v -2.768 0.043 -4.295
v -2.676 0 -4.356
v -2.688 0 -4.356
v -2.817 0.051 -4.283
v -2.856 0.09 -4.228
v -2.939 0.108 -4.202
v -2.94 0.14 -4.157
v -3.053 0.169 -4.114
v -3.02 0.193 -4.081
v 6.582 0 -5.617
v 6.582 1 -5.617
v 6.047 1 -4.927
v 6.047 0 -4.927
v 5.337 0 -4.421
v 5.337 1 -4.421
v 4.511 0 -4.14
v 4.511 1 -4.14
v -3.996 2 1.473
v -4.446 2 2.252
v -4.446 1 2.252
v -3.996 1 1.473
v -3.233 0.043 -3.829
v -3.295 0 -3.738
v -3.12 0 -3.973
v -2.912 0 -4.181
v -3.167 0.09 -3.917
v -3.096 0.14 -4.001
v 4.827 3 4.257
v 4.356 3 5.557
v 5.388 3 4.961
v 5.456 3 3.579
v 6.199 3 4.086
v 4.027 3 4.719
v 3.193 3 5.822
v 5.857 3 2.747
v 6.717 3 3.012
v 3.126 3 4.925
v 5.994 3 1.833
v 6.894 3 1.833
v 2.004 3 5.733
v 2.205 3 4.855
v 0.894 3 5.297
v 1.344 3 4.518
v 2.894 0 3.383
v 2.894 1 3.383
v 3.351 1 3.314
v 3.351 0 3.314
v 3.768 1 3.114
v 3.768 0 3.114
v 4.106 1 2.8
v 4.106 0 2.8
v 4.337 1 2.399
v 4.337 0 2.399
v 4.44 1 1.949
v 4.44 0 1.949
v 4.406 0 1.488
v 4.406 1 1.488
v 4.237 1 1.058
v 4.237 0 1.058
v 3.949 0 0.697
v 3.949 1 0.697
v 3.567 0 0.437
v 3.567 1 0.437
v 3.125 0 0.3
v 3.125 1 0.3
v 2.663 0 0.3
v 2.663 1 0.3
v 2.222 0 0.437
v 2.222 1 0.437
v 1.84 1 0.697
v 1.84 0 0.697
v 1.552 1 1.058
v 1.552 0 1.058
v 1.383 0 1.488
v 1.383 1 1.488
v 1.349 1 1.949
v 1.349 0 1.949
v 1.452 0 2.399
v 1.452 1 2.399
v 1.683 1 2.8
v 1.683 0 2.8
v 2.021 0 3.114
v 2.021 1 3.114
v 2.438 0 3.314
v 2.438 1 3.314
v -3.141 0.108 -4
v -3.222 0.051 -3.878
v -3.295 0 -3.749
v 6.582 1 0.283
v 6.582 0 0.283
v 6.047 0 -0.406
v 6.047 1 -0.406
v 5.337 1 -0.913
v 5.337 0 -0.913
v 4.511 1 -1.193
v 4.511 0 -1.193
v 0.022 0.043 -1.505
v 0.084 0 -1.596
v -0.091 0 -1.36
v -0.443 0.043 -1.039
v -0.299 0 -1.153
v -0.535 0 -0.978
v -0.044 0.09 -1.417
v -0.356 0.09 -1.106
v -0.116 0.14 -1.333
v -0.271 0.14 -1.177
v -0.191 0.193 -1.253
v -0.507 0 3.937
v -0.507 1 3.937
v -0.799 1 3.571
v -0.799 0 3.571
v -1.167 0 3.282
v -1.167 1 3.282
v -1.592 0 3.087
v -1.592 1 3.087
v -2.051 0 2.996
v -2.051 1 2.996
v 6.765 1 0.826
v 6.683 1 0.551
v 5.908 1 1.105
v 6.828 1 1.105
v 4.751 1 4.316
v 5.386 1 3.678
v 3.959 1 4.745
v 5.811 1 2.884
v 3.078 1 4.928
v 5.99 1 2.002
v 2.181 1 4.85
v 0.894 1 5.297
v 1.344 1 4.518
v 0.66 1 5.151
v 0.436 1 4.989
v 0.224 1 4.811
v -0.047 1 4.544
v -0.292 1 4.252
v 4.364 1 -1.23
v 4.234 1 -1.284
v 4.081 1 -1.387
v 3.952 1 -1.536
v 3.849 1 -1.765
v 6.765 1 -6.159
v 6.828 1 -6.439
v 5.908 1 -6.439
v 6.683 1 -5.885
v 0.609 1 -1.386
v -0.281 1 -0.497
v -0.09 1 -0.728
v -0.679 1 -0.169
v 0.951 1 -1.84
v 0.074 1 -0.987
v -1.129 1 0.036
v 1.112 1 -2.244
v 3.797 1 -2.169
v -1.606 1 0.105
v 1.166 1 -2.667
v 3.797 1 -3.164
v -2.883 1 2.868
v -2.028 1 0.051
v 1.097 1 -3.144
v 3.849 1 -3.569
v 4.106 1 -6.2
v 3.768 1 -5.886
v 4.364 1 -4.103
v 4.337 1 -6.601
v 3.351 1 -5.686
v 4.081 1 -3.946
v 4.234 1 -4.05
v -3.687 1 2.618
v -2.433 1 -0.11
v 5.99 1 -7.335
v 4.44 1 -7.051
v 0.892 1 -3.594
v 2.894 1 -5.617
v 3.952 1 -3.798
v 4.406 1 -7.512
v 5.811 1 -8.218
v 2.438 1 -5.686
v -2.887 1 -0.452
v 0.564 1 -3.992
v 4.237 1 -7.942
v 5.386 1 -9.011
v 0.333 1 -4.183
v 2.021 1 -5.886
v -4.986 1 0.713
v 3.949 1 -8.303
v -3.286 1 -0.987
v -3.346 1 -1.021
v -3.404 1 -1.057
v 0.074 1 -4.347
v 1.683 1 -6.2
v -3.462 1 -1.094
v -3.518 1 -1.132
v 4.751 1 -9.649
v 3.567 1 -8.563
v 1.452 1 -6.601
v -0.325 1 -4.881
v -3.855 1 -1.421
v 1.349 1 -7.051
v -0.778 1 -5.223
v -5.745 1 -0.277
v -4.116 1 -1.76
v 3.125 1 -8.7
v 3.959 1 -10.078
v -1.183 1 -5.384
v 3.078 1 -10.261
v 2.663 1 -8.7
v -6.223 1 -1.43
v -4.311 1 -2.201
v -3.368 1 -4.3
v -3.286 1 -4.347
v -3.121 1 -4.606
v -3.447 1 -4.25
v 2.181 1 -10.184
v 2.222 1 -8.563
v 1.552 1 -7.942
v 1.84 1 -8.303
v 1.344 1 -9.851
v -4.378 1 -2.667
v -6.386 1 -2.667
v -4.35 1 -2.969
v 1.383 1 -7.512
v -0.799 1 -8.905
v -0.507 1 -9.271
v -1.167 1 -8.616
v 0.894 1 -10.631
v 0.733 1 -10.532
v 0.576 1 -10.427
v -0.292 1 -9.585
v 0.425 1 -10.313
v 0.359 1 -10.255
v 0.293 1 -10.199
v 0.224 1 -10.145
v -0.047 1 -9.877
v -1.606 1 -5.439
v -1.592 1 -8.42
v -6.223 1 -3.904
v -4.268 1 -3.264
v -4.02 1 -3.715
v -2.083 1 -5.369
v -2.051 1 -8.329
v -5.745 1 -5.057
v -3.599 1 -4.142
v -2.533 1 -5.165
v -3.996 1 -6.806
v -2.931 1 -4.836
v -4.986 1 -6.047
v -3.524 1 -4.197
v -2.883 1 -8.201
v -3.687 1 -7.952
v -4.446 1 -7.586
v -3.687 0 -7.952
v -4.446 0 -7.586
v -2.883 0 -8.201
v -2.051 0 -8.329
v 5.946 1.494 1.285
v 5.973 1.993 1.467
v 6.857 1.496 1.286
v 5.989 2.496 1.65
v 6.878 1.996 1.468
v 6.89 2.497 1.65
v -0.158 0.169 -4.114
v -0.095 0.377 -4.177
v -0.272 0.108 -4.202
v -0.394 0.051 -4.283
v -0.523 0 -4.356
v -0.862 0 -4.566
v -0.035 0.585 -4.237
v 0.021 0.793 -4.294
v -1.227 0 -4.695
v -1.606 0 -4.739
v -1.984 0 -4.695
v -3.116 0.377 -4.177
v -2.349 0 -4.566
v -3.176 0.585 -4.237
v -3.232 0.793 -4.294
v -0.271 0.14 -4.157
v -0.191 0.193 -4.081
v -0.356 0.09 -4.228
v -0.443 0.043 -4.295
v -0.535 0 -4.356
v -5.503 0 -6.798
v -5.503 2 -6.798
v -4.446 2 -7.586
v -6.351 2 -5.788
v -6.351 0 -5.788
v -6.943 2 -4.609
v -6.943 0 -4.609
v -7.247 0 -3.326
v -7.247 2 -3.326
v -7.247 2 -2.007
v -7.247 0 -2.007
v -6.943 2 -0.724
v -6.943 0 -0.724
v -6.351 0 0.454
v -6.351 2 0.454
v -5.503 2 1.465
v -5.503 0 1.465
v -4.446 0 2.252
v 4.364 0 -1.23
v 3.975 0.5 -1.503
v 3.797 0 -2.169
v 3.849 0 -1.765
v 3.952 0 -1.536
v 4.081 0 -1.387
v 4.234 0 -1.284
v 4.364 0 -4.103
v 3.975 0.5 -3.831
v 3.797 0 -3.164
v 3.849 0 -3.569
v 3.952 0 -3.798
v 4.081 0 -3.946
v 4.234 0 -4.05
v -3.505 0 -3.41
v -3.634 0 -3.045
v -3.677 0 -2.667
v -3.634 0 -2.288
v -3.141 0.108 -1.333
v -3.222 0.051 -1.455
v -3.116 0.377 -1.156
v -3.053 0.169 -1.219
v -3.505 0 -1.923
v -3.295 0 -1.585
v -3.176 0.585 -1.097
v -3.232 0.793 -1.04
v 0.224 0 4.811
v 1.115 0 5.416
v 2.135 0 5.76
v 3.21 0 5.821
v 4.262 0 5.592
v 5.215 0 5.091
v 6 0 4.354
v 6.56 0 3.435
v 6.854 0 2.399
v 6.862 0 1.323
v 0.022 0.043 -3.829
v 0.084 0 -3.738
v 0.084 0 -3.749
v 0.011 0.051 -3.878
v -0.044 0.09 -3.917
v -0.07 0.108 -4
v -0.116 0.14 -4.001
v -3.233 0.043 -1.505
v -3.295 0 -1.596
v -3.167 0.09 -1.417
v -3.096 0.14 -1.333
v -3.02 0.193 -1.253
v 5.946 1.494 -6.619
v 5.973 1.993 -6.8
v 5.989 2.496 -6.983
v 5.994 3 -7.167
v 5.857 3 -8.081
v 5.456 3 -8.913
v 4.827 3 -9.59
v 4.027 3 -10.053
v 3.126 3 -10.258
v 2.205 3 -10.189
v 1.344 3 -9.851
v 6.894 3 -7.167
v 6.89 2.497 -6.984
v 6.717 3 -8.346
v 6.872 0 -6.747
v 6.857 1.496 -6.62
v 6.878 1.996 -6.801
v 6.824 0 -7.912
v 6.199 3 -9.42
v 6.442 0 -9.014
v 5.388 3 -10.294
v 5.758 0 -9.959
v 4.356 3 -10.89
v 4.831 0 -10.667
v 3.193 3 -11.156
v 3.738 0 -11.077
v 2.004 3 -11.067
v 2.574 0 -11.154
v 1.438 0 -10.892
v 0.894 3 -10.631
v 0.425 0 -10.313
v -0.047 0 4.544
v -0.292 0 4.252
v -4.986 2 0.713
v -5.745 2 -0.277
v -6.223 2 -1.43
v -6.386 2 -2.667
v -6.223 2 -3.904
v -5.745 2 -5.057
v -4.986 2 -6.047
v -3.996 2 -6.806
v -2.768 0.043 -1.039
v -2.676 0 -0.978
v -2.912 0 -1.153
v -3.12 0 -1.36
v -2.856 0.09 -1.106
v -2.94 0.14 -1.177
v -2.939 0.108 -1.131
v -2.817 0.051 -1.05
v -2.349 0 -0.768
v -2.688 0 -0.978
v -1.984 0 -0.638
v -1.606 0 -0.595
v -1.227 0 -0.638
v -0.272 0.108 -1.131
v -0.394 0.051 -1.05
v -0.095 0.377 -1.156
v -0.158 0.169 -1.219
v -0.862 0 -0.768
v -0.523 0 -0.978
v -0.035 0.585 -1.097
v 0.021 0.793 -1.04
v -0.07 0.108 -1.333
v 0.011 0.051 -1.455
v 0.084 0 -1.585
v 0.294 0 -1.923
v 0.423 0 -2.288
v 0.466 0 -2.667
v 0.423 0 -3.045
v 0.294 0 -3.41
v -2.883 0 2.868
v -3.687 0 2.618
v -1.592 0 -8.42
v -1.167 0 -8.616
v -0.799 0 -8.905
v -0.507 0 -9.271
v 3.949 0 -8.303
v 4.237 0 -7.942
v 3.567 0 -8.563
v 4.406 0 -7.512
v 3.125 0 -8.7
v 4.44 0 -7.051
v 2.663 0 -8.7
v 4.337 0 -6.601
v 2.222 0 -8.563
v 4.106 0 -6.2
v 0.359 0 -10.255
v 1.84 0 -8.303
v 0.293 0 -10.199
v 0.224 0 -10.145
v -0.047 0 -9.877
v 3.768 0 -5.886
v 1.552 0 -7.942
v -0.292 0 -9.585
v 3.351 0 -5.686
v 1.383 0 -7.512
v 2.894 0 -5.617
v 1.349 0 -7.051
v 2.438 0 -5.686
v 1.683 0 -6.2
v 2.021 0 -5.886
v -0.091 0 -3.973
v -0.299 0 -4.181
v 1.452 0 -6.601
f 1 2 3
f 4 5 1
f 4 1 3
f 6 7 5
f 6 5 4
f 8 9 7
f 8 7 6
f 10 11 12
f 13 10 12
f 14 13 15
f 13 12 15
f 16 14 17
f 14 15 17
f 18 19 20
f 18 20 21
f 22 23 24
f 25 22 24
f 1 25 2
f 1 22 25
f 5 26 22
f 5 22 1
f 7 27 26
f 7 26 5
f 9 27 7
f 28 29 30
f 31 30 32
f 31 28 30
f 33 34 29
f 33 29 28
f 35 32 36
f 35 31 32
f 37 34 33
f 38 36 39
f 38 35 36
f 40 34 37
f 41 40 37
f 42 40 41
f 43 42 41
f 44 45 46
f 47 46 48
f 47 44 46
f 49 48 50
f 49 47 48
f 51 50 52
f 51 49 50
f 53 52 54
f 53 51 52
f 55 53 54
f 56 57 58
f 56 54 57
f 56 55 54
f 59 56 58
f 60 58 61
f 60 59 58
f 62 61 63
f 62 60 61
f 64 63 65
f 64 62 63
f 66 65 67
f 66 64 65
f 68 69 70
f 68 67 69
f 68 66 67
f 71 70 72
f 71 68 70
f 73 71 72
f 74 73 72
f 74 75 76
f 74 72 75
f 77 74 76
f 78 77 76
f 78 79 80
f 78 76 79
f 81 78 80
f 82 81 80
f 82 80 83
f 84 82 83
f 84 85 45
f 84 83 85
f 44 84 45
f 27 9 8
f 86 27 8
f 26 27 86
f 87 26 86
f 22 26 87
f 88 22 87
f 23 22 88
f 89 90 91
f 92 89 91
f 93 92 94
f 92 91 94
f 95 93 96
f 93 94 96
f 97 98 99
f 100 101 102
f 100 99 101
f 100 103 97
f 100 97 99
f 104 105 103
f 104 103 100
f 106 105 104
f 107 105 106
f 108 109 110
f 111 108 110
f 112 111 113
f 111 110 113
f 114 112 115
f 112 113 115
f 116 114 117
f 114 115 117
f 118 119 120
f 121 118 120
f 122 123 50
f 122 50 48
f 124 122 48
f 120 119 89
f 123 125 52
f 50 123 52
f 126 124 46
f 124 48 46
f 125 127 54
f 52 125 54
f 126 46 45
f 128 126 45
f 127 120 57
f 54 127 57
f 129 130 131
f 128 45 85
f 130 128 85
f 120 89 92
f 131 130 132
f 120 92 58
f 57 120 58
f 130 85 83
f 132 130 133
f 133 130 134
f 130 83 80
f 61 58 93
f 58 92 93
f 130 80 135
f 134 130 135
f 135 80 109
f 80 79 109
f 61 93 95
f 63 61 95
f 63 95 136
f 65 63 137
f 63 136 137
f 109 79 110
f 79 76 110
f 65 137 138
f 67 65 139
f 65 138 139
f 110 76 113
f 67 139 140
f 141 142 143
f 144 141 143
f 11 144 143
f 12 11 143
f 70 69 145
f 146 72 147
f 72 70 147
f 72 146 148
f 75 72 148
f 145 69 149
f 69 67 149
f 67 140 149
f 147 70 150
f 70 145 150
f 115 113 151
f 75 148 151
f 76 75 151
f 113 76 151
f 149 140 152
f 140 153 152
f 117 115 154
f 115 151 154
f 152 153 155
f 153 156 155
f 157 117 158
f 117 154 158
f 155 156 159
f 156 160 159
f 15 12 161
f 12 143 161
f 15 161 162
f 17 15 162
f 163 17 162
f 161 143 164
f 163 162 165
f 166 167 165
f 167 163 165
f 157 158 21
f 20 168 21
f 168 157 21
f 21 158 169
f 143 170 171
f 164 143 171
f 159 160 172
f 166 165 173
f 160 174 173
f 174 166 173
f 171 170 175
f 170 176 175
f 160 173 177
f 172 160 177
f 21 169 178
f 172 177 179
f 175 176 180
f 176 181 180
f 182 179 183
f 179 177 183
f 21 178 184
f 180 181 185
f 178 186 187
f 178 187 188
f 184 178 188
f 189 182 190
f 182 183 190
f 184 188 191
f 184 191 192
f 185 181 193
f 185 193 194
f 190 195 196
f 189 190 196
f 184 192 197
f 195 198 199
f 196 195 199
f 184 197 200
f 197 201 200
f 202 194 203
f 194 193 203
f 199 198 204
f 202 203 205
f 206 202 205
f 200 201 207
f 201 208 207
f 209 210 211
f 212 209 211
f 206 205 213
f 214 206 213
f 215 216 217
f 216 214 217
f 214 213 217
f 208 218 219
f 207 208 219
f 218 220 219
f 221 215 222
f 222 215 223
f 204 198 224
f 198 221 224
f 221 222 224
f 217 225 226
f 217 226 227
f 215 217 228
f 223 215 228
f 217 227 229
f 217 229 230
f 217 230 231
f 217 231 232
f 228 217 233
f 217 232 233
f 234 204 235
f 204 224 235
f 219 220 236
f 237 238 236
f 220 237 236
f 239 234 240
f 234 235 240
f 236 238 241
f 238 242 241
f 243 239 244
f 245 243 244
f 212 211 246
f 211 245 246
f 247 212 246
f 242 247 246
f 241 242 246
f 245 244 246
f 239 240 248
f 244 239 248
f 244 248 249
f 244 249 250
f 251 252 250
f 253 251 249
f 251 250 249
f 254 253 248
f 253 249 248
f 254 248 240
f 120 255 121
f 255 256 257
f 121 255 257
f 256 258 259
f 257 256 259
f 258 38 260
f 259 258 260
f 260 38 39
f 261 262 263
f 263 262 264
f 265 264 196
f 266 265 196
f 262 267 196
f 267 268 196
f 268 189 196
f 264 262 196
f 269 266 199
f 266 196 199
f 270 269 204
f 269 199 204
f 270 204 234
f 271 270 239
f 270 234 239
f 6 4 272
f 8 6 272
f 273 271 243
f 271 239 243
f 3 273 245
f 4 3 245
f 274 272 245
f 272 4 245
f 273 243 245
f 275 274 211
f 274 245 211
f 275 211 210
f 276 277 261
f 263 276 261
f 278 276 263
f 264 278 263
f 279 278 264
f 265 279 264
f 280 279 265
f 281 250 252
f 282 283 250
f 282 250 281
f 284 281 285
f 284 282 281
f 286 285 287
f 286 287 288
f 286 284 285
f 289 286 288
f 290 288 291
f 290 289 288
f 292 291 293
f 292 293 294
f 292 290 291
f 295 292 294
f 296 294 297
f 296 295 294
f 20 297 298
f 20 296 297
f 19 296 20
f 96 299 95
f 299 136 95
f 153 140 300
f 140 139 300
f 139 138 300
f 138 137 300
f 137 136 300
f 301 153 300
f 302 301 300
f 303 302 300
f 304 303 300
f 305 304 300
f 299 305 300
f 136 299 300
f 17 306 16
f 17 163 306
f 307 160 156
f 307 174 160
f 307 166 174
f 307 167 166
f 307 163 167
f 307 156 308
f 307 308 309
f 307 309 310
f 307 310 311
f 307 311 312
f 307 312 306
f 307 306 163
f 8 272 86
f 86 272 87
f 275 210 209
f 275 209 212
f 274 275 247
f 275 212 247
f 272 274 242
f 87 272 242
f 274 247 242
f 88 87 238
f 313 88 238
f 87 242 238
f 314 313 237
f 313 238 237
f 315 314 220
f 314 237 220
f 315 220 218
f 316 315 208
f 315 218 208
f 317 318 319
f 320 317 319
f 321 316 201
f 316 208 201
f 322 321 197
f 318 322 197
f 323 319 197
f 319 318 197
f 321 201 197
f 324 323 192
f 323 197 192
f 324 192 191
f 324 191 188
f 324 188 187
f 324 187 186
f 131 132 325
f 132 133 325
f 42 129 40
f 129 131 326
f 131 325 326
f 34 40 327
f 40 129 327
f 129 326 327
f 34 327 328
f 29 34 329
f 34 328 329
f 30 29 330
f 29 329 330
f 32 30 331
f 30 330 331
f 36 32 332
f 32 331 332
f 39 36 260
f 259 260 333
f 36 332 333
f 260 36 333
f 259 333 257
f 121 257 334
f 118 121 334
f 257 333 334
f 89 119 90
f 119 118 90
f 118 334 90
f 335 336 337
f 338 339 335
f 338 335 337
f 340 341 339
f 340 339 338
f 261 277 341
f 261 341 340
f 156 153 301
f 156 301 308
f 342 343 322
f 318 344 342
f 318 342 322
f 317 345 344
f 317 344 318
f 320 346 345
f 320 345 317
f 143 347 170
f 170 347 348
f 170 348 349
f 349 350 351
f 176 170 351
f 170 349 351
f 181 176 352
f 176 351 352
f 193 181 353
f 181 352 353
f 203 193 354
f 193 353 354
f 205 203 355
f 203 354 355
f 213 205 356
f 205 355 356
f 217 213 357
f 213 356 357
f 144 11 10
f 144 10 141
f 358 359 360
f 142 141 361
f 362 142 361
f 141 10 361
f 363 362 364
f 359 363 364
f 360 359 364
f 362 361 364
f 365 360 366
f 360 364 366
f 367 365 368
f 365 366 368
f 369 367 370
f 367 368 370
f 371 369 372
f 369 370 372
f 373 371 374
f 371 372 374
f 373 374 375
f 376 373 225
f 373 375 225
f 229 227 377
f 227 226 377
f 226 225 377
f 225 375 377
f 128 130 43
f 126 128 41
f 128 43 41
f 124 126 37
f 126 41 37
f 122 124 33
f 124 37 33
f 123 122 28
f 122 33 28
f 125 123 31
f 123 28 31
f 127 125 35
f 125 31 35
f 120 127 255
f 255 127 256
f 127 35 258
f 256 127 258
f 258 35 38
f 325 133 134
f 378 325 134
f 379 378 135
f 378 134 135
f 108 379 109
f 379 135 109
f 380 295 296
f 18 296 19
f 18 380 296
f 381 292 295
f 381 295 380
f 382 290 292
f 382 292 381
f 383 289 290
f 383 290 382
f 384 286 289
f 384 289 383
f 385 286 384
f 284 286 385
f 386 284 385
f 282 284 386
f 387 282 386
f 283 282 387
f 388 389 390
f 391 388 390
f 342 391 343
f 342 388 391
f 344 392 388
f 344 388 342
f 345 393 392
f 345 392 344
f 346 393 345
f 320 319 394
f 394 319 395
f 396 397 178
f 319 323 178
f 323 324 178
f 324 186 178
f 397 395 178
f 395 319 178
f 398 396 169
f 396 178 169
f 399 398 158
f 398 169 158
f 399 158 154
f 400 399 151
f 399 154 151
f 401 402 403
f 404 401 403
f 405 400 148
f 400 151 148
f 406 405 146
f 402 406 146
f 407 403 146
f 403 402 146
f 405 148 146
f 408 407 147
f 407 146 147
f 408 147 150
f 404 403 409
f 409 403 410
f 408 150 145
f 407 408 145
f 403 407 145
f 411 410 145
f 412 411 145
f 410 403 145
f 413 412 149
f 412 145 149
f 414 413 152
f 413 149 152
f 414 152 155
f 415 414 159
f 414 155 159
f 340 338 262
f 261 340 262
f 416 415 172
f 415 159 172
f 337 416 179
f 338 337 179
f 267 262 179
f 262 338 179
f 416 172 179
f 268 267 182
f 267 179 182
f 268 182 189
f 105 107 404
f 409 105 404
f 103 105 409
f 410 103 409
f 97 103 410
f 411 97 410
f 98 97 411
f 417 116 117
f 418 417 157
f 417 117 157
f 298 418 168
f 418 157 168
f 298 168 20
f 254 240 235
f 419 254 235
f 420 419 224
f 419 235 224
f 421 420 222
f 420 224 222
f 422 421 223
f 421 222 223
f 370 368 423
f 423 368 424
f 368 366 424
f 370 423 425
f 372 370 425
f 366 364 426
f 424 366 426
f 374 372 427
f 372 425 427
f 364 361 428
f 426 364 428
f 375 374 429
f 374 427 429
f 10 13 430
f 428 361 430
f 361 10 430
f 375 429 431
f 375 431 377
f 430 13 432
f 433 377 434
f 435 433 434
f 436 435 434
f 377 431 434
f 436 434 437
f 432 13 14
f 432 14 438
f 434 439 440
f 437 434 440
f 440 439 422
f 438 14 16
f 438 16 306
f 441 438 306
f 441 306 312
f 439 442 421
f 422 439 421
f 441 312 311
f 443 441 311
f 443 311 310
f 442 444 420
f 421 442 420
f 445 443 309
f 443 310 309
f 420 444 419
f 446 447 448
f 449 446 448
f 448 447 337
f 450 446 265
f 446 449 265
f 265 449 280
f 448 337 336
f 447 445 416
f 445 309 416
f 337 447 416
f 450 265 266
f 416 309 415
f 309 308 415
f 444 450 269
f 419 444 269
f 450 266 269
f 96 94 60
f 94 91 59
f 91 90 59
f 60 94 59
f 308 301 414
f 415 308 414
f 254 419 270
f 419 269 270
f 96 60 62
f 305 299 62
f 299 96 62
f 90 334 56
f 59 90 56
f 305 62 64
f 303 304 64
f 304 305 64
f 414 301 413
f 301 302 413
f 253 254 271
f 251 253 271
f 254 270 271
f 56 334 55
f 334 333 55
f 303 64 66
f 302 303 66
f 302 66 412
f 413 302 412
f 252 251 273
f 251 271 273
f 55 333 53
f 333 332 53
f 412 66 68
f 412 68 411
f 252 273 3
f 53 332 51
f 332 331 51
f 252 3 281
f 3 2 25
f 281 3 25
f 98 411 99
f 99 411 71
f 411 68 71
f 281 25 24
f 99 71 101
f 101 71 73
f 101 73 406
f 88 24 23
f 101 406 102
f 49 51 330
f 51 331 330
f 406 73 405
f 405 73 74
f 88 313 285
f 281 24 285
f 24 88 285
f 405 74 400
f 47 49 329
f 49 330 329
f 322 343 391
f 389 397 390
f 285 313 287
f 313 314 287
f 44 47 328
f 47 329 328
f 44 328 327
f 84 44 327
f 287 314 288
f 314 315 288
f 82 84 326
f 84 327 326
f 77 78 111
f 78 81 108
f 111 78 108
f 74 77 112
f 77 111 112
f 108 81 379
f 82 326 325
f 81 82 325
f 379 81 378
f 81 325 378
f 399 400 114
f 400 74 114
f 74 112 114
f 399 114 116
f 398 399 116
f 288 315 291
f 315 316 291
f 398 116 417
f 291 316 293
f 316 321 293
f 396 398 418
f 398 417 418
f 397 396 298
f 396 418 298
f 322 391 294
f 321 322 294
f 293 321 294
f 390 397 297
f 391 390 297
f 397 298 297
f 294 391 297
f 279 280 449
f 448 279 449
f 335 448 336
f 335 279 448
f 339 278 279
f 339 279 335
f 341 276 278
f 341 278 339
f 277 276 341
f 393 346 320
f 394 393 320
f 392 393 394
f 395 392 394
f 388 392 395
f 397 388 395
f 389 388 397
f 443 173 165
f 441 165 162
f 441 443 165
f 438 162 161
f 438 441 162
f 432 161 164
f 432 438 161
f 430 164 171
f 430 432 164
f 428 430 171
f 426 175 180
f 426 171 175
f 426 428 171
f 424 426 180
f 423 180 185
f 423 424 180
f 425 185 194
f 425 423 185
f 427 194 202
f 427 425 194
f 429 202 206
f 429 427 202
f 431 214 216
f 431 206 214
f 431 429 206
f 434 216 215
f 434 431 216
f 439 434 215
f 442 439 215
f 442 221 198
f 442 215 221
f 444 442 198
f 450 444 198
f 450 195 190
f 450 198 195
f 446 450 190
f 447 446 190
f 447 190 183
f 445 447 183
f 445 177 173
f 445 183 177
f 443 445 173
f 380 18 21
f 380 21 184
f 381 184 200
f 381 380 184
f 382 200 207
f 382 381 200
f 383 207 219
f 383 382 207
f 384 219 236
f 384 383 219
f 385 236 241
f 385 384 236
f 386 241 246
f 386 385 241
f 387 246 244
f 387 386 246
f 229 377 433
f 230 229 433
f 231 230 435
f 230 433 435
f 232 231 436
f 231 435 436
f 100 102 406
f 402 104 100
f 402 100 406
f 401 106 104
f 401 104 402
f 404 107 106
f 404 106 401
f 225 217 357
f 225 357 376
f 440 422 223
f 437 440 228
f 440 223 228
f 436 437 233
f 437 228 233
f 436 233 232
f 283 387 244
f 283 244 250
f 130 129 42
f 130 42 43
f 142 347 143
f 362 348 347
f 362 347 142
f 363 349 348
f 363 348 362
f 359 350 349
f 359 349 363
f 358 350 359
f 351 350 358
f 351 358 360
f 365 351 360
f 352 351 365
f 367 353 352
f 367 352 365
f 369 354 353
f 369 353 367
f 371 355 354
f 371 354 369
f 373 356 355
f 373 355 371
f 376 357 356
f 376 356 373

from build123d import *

# Parameters (mm, degrees)
SKETCH1_R                = 1.55
BOSS_EXTRUDE1_DEPTH      = 3
CUT_EXTRUDE1_DEPTH       = 2
SKETCH3_W                = 5.9
SKETCH3_H                = 3
BOSS_EXTRUDE2_DEPTH      = 8
SKETCH4_W                = 13.659458738
SKETCH4_H                = 9
CUT_EXTRUDE2_DEPTH       = 2
CUT_EXTRUDE2_DRAFT       = -20
SKETCH5_R                = 0.75
CUT_EXTRUDE3_DEPTH       = 1.3
CUT_EXTRUDE4_DEPTH       = 2
CUT_EXTRUDE5_DEPTH       = 2
CUT_EXTRUDE6_DEPTH       = 2
CUT_EXTRUDE7_DEPTH       = 18.586771109
CUT_EXTRUDE7_DEPTH_BACK  = 18.586771109
SKETCH11_R               = 2
SKETCH12_R               = 2.025
CUT_EXTRUDE8_DEPTH       = 6
CIRPATTERN1_COUNT        = 4
SKETCH13_W               = 4.09775222
SKETCH13_H               = 2.995
CUT_EXTRUDE9_DEPTH       = 10
CUT_EXTRUDE10_START      = -0.177953
SKETCH14_W               = 5.9
SKETCH14_H               = 1
CUT_EXTRUDE10_DEPTH      = 0.177953
FILLET1_SIZE             = 1
SKETCH17_R               = 1.662744167
BOSS_EXTRUDE4_DEPTH      = 1
SKETCH16_R               = 1.665674875
BOSS_EXTRUDE3_DEPTH      = 1
CUT_EXTRUDE11_DEPTH      = 18.453079278
CUT_EXTRUDE11_DEPTH_BACK = 18.453079278
SKETCH18_W               = 2.600219514
SKETCH18_H               = 5.959262744
CUT_EXTRUDE12_DEPTH      = 18.309245399
BOSS_EXTRUDE5_START      = -3
BOSS_EXTRUDE5_DEPTH      = 3
CUT_EXTRUDE13_DEPTH      = 3
SKETCH22_W               = 6.55065816
SKETCH22_H               = 15.562546266
CUT_EXTRUDE14_DEPTH      = 1
SKETCH23_W               = 5.9
SKETCH23_H               = 1
CUT_EXTRUDE15_DEPTH      = 6.491471
FILLET2_R                = 3


with BuildPart() as part:
    # Sketch1 → Boss-Extrude1 (new body)
    with BuildSketch(Plane(origin=(0, 0, 0), x_dir=(1, 0, 0), z_dir=(0, 1, 0))):
        with BuildLine():
            ThreePointArc((-3.635881537, 10.313312638), (-8.934039083, 9.995244626), (-9.252107096, 4.69708708))
            ThreePointArc((-9.252107096, 4.69708708), (-8.462514606, 2.666817501), (-9.252107096, 0.636547923))
            ThreePointArc((-9.252107096, 0.636547923), (-8.934039083, -4.661609623), (-3.635881537, -4.979677635))
            ThreePointArc((-3.635881537, -4.979677635), (-1.736579677, -4.192940503), (0.224018718, -4.811290568))
            ThreePointArc((0.224018718, -4.811290568), (5.628690512, -4.752701294), (6.040883178, 0.636547923))
            ThreePointArc((6.040883178, 0.636547923), (5.251290689, 2.666817501), (6.040883178, 4.69708708))
            ThreePointArc((6.040883178, 4.69708708), (5.722815166, 9.995244626), (0.42465762, 10.313312638))
            ThreePointArc((0.42465762, 10.313312638), (-1.605611959, 9.523720149), (-3.635881537, 10.313312638))
        make_face()
        with Locations(Location((-6.105611959, 7.166817501, 0), (0, 0, 270))):
            Circle(SKETCH1_R, mode=Mode.SUBTRACT)
        with Locations(Location((2.894388041, 7.166817501, 0), (0, 0, 270))):
            Circle(SKETCH1_R, mode=Mode.SUBTRACT)
        with Locations(Location((-6.105611959, -1.833182499, 0), (0, 0, 270))):
            Circle(SKETCH1_R, mode=Mode.SUBTRACT)
        with Locations(Location((2.894388041, -1.833182499, 0), (0, 0, 270))):
            Circle(SKETCH1_R, mode=Mode.SUBTRACT)
    extrude(amount=BOSS_EXTRUDE1_DEPTH)

    # Sketch2 → Cut-Extrude1 (cut)
    with BuildSketch(Plane(origin=(0, 3, 0), x_dir=(1, 0, 0), z_dir=(0, 1, 0))):
        with BuildLine():
            ThreePointArc((-3.492463443, 8.83458692), (-8.29764298, 9.358848523), (-7.773381378, 4.553668986))
            ThreePointArc((-7.773381378, 4.553668986), (-6.33006143, 2.666817501), (-7.773381378, 0.779966017))
            ThreePointArc((-7.773381378, 0.779966017), (-8.29764298, -4.02521352), (-3.492463443, -3.500951917))
            ThreePointArc((-3.492463443, -3.500951917), (-1.605611959, -2.05763197), (0.281239525, -3.500951917))
            ThreePointArc((0.281239525, -3.500951917), (5.086419063, -4.02521352), (4.56215746, 0.779966017))
            ThreePointArc((4.56215746, 0.779966017), (3.118837513, 2.666817501), (4.56215746, 4.553668986))
            ThreePointArc((4.56215746, 4.553668986), (5.086419063, 9.358848523), (0.281239525, 8.83458692))
            ThreePointArc((0.281239525, 8.83458692), (-1.605611959, 7.391266973), (-3.492463443, 8.83458692))
        make_face()
    extrude(amount=-CUT_EXTRUDE1_DEPTH, mode=Mode.SUBTRACT)

    # Sketch3 → Boss-Extrude2 (add)
    with BuildSketch(Plane(origin=(5.251290689, 0, -2.666817501), x_dir=(0, 0, -1), z_dir=(1, 0, 0))):
        with Locations((0, 1.5)):
            Rectangle(SKETCH3_W, SKETCH3_H)
    extrude(amount=BOSS_EXTRUDE2_DEPTH)


with BuildPart() as cut_extrude2_tool:
    # Sketch4 → Cut-Extrude2 (with draft: the straight prism first)
    with BuildSketch(Plane(origin=(0, 3, 0), x_dir=(1, 0, 0), z_dir=(0, 1, 0))):
        with Locations((7.288008407, 2.666817501)):
            Rectangle(SKETCH4_W, SKETCH4_H)
    extrude(amount=-CUT_EXTRUDE2_DEPTH)
    # Cut-Extrude2: the draft: its side faces are tilted about the plane it starts from
    cut_extrude2_sides = [cut_extrude2_tool.faces().sort_by_distance(p)[0] for p in [
        (7.288008407, 2, 1.833182499),
        (14.117737776, 2, -2.666817501),
        (7.288008407, 2, -7.166817501),
        (0.458279038, 2, -2.666817501),
    ]]
    draft(cut_extrude2_sides, Plane(origin=(0, 3, 0), x_dir=(1, 0, 0), z_dir=(0, 1, 0)), CUT_EXTRUDE2_DRAFT)


with BuildPart() as part_1:
    add(part.part)

    # Cut-Extrude2: cut by cut_extrude2_tool
    add(cut_extrude2_tool.part, mode=Mode.SUBTRACT)

    # Sketch5 → Cut-Extrude3 (cut)
    with BuildSketch(Plane(origin=(0, 1, 0), x_dir=(1, 0, 0), z_dir=(0, 1, 0))):
        with Locations(Location((10.394388041, 2.716817501, 0), (0, 0, 270))):
            Circle(SKETCH5_R)
    extrude(amount=-CUT_EXTRUDE3_DEPTH, mode=Mode.SUBTRACT)

    # Sketch6 → Cut-Extrude4 (cut)
    with BuildSketch(Plane(origin=(0, 3, 0), x_dir=(1, 0, 0), z_dir=(0, 1, 0))):
        with BuildLine():
            Line((-3.492463443, -3.500951917), (-3.702450132, -1.327552789))
            Line((-3.702450132, -1.327552789), (0.368176256, -0.93426223))
            Line((0.368176256, -0.93426223), (0.281239525, -3.500951917))
            ThreePointArc((0.281239525, -3.500951917), (-1.605611959, -2.432230608), (-3.492463443, -3.500951917))
        make_face()
    extrude(amount=-CUT_EXTRUDE4_DEPTH, mode=Mode.SUBTRACT)

    # Sketch9 → Cut-Extrude5 (cut)
    with BuildSketch(Plane(origin=(0, 3, 0), x_dir=(1, 0, 0), z_dir=(0, 1, 0))):
        with BuildLine():
            Line((-7.773381378, 4.553668986), (-3.245284386, 5.2751304))
            Line((-3.245284386, 5.2751304), (-4.565802385, 0.235004819))
            Line((-4.565802385, 0.235004819), (-7.773381378, 0.779966017))
            ThreePointArc((-7.773381378, 0.779966017), (-6.704660068, 2.666817501), (-7.773381378, 4.553668986))
        make_face()
    extrude(amount=-CUT_EXTRUDE5_DEPTH, mode=Mode.SUBTRACT)

    # Sketch10 → Cut-Extrude6 (cut)
    with BuildSketch(Plane(origin=(0, 3, 0), x_dir=(1, 0, 0), z_dir=(0, 1, 0))):
        with BuildLine():
            Line((-3.492463443, 8.83458692), (-4.484720145, 5.022165409))
            Line((-4.484720145, 5.022165409), (-0.857976827, 4.078235061))
            Line((-0.857976827, 4.078235061), (0.281239525, 8.83458692))
            ThreePointArc((0.281239525, 8.83458692), (-1.605611959, 7.765865611), (-3.492463443, 8.83458692))
        make_face()
    extrude(amount=-CUT_EXTRUDE6_DEPTH, mode=Mode.SUBTRACT)

    # Sketch11 → Cut-Extrude7 (cut, two sides: drawn at the far end of the back side and taken through both)
    with BuildSketch(Plane.XZ.offset(-CUT_EXTRUDE7_DEPTH_BACK)):
        with Locations(Location((-1.605611959, -2.666817501, 0), (0, 0, 90))):
            Circle(SKETCH11_R)
    extrude(amount=CUT_EXTRUDE7_DEPTH + CUT_EXTRUDE7_DEPTH_BACK, mode=Mode.SUBTRACT)

    # Sketch12 → Cut-Extrude8 (cut)
    with BuildSketch(Plane(origin=(3.468967433, 4.954198925, 0), x_dir=(0.8191520442889871, -0.5735764363510527, -5.842048773291199e-15), z_dir=(0.5735764363510527, 0.8191520442889871, 8.343310310865899e-15))):
        with Locations((-1.643071141, 2.666817501)):
            Circle(SKETCH12_R)
    cut_extrude8 = extrude(amount=-CUT_EXTRUDE8_DEPTH, mode=Mode.SUBTRACT)

    # CirPattern1: Cut-Extrude8 ×4 about axis
    cirpattern1_axis = Axis((-1.605611959, 0, -2.666817501), (0, 1, 0))
    for i in range(1, CIRPATTERN1_COUNT):
        add(cut_extrude8.rotate(cirpattern1_axis, i * 360 / CIRPATTERN1_COUNT), mode=Mode.SUBTRACT)

    # Sketch13 → Cut-Extrude9 (cut)
    with BuildSketch(Plane(origin=(0, 1, 0), x_dir=(1, 0, 0), z_dir=(0, 1, 0))):
        with Locations((5.845511931, 2.666817501)):
            Rectangle(SKETCH13_W, SKETCH13_H)
    extrude(amount=-CUT_EXTRUDE9_DEPTH, mode=Mode.SUBTRACT)

    # Sketch14 → Cut-Extrude10 (cut)
    with BuildSketch(Plane(origin=(13.251290689, 0, 0), x_dir=(0, 0, -1), z_dir=(1, 0, 0)).offset(CUT_EXTRUDE10_START)):
        with Locations((2.666817501, 0.5)):
            Rectangle(SKETCH14_W, SKETCH14_H)
    extrude(amount=CUT_EXTRUDE10_DEPTH, mode=Mode.SUBTRACT)

    # Fillet1
    # a fillet whose section is not a circle: 1 mm, written as the material it adds along each edge
    with BuildSketch(Plane(origin=(7.894388041, 1, -4.164317501), x_dir=(-1, 0, 0), z_dir=(0, -1, 0)), Plane(origin=(3.796635821, 1, -4.164317501), x_dir=(0, 0, 1), z_dir=(0, -1, 0))) as fillet1_piece_1:
        with BuildLine():
            Bezier((FILLET1_SIZE, 0), (0, 0), (0, -FILLET1_SIZE), weights=[1, 1, 1])
            Line((0, -FILLET1_SIZE), (0, 0))
            Line((0, 0), (FILLET1_SIZE, 0))
        make_face()
    extrude(amount=1)
    with BuildSketch(Plane(origin=(7.894388041, 1, -1.169317501), x_dir=(-1, 0, 0), z_dir=(0, -1, 0)), Plane(origin=(3.796635821, 1, -1.169317501), x_dir=(0, 0, -1), z_dir=(0, -1, 0))) as fillet1_piece_2:
        with BuildLine():
            Bezier((FILLET1_SIZE, 0), (0, 0), (0, FILLET1_SIZE), weights=[1, 1, 1])
            Line((0, FILLET1_SIZE), (0, 0))
            Line((0, 0), (FILLET1_SIZE, 0))
        make_face()
    extrude(amount=1)

    # Sketch17 → Boss-Extrude4 (add)
    with BuildSketch(Plane(origin=(0, 1, 0), x_dir=(1, 0, 0), z_dir=(0, 1, 0))):
        with Locations((-6.105611959, -1.833182499)):
            Circle(SKETCH17_R)
    extrude(amount=-BOSS_EXTRUDE4_DEPTH)

    # Sketch16 → Boss-Extrude3 (add)
    with BuildSketch(Plane(origin=(0, 1, 0), x_dir=(1, 0, 0), z_dir=(0, 1, 0))):
        with Locations((-6.105611959, 7.166817501)):
            Circle(SKETCH16_R)
    extrude(amount=-BOSS_EXTRUDE3_DEPTH)

    # Sketch15 → Cut-Extrude11 (cut, two sides: drawn at the far end of the back side and taken through both)
    with BuildSketch(Plane.XZ.offset(-CUT_EXTRUDE11_DEPTH_BACK)):
        with BuildLine():
            Line((6.894388041, -7.166817501), (6.894388041, -13.928074113))
            Line((6.894388041, -13.928074113), (-13.514201906, -13.928074113))
            Line((-13.514201906, -13.928074113), (-13.514201906, 8.046636231))
            Line((-13.514201906, 8.046636231), (6.894388041, 8.046636231))
            Line((6.894388041, 8.046636231), (6.894388041, 1.833182499))
            ThreePointArc((6.894388041, 1.833182499), (3.988180525, 5.68072951), (-0.50742096, 3.9373915))
            ThreePointArc((-0.50742096, 3.9373915), (-1.166872385, 3.282048931), (-2.051368819, 2.995664359))
            ThreePointArc((-2.051368819, 2.995664359), (-7.285611959, -2.666817501), (-2.051368819, -8.329299362))
            ThreePointArc((-2.051368819, -8.329299362), (-1.166872385, -8.615683934), (-0.50742096, -9.271026503))
            ThreePointArc((-0.50742096, -9.271026503), (3.988180525, -11.014364512), (6.894388041, -7.166817501))
        make_face()
    extrude(amount=CUT_EXTRUDE11_DEPTH + CUT_EXTRUDE11_DEPTH_BACK, mode=Mode.SUBTRACT)

    # Sketch18 → Cut-Extrude12 (cut, through all)
    with BuildSketch(Plane(origin=(0, 1, 0), x_dir=(1, 0, 0), z_dir=(0, 1, 0))):
        with Locations((-7.701659958, 2.979631372)):
            Rectangle(SKETCH18_W, SKETCH18_H)
    extrude(amount=CUT_EXTRUDE12_DEPTH, mode=Mode.SUBTRACT)

    # Sketch19 → Boss-Extrude5 (add)
    with BuildSketch(Plane.XZ.offset(BOSS_EXTRUDE5_START)):
        with BuildLine():
            Line((-3.995611959, -6.806418932), (-4.445611959, -7.585841795))
            ThreePointArc((-4.445611959, -7.585841795), (-7.285611959, -2.666817501), (-4.445611959, 2.252206792))
            Line((-4.445611959, 2.252206792), (-3.995611959, 1.472783929))
            ThreePointArc((-3.995611959, 1.472783929), (-6.385611959, -2.666817501), (-3.995611959, -6.806418932))
        make_face()
    extrude(amount=BOSS_EXTRUDE5_DEPTH)

    # Sketch20 → Cut-Extrude13 (cut)
    with BuildSketch(Plane(origin=(0, 1, 0), x_dir=(1, 0, 0), z_dir=(0, 1, 0))):
        Polygon((2.894388041, 7.166817501), (-0.075580701, 12.31095426), (-3.796704653, 11.559770235), (-3.289503394, -7.421479647), (-0.182006076, -7.161653415), (2.894388041, -1.833182499), align=None)
    extrude(amount=CUT_EXTRUDE13_DEPTH, mode=Mode.SUBTRACT)

    # Sketch22 → Cut-Extrude14 (cut)
    with BuildSketch(Plane(origin=(0, 3, 0), x_dir=(1, 0, 0), z_dir=(0, 1, 0))):
        with Locations((-5.379656345, 2.553222273)):
            Rectangle(SKETCH22_W, SKETCH22_H)
    extrude(amount=-CUT_EXTRUDE14_DEPTH, mode=Mode.SUBTRACT)

    # Sketch23 → Cut-Extrude15 (cut)
    with BuildSketch(Plane(origin=(13.073337513, 0, 0), x_dir=(0, 0, -1), z_dir=(1, 0, 0))):
        with Locations((2.666817501, 0.5)):
            Rectangle(SKETCH23_W, SKETCH23_H)
    extrude(amount=-CUT_EXTRUDE15_DEPTH, mode=Mode.SUBTRACT)

    # Fillet2
    # the kernel refuses this fillet: 3 mm, written as the material it takes off along each edge
    with BuildSketch(Plane(origin=(6.581866513, 6.178617069, -4.164317501), x_dir=(-0.999932634511536, 1.396498453398939e-14, 0.011607171869965063), z_dir=(0, -1, 0)), Plane(origin=(6.581866513, -5.178617069, -1.169317501), x_dir=(-0.999932634511536, 1.3964984533989391e-14, -0.01160717186996909), z_dir=(0, 1, 0))) as fillet2_piece_1:
        with BuildLine():
            CenterArc((2.578666289, 2.956810514), FILLET2_R, 210.097266111, 50.168799246)
            Line((-0.016859759, 1.452402148), (-0.276412364, 1.301961311))
            ThreePointArc((-0.276412364, 1.301961311), (-0.308409499, 0.722718924), (-0.29997979, -0.003482152))
            Line((-0.29997979, -0.003482152), (0.003482152, -0.29997979))
            ThreePointArc((0.003482152, -0.29997979), (1.788592581, -0.279258311), (2.020724882, -0.295681051))
            Line((2.020724882, -0.295681051), (2.071446828, 0))
        make_face()
    extrude(amount=11.357234139, mode=Mode.SUBTRACT)


solid = part_1.part
